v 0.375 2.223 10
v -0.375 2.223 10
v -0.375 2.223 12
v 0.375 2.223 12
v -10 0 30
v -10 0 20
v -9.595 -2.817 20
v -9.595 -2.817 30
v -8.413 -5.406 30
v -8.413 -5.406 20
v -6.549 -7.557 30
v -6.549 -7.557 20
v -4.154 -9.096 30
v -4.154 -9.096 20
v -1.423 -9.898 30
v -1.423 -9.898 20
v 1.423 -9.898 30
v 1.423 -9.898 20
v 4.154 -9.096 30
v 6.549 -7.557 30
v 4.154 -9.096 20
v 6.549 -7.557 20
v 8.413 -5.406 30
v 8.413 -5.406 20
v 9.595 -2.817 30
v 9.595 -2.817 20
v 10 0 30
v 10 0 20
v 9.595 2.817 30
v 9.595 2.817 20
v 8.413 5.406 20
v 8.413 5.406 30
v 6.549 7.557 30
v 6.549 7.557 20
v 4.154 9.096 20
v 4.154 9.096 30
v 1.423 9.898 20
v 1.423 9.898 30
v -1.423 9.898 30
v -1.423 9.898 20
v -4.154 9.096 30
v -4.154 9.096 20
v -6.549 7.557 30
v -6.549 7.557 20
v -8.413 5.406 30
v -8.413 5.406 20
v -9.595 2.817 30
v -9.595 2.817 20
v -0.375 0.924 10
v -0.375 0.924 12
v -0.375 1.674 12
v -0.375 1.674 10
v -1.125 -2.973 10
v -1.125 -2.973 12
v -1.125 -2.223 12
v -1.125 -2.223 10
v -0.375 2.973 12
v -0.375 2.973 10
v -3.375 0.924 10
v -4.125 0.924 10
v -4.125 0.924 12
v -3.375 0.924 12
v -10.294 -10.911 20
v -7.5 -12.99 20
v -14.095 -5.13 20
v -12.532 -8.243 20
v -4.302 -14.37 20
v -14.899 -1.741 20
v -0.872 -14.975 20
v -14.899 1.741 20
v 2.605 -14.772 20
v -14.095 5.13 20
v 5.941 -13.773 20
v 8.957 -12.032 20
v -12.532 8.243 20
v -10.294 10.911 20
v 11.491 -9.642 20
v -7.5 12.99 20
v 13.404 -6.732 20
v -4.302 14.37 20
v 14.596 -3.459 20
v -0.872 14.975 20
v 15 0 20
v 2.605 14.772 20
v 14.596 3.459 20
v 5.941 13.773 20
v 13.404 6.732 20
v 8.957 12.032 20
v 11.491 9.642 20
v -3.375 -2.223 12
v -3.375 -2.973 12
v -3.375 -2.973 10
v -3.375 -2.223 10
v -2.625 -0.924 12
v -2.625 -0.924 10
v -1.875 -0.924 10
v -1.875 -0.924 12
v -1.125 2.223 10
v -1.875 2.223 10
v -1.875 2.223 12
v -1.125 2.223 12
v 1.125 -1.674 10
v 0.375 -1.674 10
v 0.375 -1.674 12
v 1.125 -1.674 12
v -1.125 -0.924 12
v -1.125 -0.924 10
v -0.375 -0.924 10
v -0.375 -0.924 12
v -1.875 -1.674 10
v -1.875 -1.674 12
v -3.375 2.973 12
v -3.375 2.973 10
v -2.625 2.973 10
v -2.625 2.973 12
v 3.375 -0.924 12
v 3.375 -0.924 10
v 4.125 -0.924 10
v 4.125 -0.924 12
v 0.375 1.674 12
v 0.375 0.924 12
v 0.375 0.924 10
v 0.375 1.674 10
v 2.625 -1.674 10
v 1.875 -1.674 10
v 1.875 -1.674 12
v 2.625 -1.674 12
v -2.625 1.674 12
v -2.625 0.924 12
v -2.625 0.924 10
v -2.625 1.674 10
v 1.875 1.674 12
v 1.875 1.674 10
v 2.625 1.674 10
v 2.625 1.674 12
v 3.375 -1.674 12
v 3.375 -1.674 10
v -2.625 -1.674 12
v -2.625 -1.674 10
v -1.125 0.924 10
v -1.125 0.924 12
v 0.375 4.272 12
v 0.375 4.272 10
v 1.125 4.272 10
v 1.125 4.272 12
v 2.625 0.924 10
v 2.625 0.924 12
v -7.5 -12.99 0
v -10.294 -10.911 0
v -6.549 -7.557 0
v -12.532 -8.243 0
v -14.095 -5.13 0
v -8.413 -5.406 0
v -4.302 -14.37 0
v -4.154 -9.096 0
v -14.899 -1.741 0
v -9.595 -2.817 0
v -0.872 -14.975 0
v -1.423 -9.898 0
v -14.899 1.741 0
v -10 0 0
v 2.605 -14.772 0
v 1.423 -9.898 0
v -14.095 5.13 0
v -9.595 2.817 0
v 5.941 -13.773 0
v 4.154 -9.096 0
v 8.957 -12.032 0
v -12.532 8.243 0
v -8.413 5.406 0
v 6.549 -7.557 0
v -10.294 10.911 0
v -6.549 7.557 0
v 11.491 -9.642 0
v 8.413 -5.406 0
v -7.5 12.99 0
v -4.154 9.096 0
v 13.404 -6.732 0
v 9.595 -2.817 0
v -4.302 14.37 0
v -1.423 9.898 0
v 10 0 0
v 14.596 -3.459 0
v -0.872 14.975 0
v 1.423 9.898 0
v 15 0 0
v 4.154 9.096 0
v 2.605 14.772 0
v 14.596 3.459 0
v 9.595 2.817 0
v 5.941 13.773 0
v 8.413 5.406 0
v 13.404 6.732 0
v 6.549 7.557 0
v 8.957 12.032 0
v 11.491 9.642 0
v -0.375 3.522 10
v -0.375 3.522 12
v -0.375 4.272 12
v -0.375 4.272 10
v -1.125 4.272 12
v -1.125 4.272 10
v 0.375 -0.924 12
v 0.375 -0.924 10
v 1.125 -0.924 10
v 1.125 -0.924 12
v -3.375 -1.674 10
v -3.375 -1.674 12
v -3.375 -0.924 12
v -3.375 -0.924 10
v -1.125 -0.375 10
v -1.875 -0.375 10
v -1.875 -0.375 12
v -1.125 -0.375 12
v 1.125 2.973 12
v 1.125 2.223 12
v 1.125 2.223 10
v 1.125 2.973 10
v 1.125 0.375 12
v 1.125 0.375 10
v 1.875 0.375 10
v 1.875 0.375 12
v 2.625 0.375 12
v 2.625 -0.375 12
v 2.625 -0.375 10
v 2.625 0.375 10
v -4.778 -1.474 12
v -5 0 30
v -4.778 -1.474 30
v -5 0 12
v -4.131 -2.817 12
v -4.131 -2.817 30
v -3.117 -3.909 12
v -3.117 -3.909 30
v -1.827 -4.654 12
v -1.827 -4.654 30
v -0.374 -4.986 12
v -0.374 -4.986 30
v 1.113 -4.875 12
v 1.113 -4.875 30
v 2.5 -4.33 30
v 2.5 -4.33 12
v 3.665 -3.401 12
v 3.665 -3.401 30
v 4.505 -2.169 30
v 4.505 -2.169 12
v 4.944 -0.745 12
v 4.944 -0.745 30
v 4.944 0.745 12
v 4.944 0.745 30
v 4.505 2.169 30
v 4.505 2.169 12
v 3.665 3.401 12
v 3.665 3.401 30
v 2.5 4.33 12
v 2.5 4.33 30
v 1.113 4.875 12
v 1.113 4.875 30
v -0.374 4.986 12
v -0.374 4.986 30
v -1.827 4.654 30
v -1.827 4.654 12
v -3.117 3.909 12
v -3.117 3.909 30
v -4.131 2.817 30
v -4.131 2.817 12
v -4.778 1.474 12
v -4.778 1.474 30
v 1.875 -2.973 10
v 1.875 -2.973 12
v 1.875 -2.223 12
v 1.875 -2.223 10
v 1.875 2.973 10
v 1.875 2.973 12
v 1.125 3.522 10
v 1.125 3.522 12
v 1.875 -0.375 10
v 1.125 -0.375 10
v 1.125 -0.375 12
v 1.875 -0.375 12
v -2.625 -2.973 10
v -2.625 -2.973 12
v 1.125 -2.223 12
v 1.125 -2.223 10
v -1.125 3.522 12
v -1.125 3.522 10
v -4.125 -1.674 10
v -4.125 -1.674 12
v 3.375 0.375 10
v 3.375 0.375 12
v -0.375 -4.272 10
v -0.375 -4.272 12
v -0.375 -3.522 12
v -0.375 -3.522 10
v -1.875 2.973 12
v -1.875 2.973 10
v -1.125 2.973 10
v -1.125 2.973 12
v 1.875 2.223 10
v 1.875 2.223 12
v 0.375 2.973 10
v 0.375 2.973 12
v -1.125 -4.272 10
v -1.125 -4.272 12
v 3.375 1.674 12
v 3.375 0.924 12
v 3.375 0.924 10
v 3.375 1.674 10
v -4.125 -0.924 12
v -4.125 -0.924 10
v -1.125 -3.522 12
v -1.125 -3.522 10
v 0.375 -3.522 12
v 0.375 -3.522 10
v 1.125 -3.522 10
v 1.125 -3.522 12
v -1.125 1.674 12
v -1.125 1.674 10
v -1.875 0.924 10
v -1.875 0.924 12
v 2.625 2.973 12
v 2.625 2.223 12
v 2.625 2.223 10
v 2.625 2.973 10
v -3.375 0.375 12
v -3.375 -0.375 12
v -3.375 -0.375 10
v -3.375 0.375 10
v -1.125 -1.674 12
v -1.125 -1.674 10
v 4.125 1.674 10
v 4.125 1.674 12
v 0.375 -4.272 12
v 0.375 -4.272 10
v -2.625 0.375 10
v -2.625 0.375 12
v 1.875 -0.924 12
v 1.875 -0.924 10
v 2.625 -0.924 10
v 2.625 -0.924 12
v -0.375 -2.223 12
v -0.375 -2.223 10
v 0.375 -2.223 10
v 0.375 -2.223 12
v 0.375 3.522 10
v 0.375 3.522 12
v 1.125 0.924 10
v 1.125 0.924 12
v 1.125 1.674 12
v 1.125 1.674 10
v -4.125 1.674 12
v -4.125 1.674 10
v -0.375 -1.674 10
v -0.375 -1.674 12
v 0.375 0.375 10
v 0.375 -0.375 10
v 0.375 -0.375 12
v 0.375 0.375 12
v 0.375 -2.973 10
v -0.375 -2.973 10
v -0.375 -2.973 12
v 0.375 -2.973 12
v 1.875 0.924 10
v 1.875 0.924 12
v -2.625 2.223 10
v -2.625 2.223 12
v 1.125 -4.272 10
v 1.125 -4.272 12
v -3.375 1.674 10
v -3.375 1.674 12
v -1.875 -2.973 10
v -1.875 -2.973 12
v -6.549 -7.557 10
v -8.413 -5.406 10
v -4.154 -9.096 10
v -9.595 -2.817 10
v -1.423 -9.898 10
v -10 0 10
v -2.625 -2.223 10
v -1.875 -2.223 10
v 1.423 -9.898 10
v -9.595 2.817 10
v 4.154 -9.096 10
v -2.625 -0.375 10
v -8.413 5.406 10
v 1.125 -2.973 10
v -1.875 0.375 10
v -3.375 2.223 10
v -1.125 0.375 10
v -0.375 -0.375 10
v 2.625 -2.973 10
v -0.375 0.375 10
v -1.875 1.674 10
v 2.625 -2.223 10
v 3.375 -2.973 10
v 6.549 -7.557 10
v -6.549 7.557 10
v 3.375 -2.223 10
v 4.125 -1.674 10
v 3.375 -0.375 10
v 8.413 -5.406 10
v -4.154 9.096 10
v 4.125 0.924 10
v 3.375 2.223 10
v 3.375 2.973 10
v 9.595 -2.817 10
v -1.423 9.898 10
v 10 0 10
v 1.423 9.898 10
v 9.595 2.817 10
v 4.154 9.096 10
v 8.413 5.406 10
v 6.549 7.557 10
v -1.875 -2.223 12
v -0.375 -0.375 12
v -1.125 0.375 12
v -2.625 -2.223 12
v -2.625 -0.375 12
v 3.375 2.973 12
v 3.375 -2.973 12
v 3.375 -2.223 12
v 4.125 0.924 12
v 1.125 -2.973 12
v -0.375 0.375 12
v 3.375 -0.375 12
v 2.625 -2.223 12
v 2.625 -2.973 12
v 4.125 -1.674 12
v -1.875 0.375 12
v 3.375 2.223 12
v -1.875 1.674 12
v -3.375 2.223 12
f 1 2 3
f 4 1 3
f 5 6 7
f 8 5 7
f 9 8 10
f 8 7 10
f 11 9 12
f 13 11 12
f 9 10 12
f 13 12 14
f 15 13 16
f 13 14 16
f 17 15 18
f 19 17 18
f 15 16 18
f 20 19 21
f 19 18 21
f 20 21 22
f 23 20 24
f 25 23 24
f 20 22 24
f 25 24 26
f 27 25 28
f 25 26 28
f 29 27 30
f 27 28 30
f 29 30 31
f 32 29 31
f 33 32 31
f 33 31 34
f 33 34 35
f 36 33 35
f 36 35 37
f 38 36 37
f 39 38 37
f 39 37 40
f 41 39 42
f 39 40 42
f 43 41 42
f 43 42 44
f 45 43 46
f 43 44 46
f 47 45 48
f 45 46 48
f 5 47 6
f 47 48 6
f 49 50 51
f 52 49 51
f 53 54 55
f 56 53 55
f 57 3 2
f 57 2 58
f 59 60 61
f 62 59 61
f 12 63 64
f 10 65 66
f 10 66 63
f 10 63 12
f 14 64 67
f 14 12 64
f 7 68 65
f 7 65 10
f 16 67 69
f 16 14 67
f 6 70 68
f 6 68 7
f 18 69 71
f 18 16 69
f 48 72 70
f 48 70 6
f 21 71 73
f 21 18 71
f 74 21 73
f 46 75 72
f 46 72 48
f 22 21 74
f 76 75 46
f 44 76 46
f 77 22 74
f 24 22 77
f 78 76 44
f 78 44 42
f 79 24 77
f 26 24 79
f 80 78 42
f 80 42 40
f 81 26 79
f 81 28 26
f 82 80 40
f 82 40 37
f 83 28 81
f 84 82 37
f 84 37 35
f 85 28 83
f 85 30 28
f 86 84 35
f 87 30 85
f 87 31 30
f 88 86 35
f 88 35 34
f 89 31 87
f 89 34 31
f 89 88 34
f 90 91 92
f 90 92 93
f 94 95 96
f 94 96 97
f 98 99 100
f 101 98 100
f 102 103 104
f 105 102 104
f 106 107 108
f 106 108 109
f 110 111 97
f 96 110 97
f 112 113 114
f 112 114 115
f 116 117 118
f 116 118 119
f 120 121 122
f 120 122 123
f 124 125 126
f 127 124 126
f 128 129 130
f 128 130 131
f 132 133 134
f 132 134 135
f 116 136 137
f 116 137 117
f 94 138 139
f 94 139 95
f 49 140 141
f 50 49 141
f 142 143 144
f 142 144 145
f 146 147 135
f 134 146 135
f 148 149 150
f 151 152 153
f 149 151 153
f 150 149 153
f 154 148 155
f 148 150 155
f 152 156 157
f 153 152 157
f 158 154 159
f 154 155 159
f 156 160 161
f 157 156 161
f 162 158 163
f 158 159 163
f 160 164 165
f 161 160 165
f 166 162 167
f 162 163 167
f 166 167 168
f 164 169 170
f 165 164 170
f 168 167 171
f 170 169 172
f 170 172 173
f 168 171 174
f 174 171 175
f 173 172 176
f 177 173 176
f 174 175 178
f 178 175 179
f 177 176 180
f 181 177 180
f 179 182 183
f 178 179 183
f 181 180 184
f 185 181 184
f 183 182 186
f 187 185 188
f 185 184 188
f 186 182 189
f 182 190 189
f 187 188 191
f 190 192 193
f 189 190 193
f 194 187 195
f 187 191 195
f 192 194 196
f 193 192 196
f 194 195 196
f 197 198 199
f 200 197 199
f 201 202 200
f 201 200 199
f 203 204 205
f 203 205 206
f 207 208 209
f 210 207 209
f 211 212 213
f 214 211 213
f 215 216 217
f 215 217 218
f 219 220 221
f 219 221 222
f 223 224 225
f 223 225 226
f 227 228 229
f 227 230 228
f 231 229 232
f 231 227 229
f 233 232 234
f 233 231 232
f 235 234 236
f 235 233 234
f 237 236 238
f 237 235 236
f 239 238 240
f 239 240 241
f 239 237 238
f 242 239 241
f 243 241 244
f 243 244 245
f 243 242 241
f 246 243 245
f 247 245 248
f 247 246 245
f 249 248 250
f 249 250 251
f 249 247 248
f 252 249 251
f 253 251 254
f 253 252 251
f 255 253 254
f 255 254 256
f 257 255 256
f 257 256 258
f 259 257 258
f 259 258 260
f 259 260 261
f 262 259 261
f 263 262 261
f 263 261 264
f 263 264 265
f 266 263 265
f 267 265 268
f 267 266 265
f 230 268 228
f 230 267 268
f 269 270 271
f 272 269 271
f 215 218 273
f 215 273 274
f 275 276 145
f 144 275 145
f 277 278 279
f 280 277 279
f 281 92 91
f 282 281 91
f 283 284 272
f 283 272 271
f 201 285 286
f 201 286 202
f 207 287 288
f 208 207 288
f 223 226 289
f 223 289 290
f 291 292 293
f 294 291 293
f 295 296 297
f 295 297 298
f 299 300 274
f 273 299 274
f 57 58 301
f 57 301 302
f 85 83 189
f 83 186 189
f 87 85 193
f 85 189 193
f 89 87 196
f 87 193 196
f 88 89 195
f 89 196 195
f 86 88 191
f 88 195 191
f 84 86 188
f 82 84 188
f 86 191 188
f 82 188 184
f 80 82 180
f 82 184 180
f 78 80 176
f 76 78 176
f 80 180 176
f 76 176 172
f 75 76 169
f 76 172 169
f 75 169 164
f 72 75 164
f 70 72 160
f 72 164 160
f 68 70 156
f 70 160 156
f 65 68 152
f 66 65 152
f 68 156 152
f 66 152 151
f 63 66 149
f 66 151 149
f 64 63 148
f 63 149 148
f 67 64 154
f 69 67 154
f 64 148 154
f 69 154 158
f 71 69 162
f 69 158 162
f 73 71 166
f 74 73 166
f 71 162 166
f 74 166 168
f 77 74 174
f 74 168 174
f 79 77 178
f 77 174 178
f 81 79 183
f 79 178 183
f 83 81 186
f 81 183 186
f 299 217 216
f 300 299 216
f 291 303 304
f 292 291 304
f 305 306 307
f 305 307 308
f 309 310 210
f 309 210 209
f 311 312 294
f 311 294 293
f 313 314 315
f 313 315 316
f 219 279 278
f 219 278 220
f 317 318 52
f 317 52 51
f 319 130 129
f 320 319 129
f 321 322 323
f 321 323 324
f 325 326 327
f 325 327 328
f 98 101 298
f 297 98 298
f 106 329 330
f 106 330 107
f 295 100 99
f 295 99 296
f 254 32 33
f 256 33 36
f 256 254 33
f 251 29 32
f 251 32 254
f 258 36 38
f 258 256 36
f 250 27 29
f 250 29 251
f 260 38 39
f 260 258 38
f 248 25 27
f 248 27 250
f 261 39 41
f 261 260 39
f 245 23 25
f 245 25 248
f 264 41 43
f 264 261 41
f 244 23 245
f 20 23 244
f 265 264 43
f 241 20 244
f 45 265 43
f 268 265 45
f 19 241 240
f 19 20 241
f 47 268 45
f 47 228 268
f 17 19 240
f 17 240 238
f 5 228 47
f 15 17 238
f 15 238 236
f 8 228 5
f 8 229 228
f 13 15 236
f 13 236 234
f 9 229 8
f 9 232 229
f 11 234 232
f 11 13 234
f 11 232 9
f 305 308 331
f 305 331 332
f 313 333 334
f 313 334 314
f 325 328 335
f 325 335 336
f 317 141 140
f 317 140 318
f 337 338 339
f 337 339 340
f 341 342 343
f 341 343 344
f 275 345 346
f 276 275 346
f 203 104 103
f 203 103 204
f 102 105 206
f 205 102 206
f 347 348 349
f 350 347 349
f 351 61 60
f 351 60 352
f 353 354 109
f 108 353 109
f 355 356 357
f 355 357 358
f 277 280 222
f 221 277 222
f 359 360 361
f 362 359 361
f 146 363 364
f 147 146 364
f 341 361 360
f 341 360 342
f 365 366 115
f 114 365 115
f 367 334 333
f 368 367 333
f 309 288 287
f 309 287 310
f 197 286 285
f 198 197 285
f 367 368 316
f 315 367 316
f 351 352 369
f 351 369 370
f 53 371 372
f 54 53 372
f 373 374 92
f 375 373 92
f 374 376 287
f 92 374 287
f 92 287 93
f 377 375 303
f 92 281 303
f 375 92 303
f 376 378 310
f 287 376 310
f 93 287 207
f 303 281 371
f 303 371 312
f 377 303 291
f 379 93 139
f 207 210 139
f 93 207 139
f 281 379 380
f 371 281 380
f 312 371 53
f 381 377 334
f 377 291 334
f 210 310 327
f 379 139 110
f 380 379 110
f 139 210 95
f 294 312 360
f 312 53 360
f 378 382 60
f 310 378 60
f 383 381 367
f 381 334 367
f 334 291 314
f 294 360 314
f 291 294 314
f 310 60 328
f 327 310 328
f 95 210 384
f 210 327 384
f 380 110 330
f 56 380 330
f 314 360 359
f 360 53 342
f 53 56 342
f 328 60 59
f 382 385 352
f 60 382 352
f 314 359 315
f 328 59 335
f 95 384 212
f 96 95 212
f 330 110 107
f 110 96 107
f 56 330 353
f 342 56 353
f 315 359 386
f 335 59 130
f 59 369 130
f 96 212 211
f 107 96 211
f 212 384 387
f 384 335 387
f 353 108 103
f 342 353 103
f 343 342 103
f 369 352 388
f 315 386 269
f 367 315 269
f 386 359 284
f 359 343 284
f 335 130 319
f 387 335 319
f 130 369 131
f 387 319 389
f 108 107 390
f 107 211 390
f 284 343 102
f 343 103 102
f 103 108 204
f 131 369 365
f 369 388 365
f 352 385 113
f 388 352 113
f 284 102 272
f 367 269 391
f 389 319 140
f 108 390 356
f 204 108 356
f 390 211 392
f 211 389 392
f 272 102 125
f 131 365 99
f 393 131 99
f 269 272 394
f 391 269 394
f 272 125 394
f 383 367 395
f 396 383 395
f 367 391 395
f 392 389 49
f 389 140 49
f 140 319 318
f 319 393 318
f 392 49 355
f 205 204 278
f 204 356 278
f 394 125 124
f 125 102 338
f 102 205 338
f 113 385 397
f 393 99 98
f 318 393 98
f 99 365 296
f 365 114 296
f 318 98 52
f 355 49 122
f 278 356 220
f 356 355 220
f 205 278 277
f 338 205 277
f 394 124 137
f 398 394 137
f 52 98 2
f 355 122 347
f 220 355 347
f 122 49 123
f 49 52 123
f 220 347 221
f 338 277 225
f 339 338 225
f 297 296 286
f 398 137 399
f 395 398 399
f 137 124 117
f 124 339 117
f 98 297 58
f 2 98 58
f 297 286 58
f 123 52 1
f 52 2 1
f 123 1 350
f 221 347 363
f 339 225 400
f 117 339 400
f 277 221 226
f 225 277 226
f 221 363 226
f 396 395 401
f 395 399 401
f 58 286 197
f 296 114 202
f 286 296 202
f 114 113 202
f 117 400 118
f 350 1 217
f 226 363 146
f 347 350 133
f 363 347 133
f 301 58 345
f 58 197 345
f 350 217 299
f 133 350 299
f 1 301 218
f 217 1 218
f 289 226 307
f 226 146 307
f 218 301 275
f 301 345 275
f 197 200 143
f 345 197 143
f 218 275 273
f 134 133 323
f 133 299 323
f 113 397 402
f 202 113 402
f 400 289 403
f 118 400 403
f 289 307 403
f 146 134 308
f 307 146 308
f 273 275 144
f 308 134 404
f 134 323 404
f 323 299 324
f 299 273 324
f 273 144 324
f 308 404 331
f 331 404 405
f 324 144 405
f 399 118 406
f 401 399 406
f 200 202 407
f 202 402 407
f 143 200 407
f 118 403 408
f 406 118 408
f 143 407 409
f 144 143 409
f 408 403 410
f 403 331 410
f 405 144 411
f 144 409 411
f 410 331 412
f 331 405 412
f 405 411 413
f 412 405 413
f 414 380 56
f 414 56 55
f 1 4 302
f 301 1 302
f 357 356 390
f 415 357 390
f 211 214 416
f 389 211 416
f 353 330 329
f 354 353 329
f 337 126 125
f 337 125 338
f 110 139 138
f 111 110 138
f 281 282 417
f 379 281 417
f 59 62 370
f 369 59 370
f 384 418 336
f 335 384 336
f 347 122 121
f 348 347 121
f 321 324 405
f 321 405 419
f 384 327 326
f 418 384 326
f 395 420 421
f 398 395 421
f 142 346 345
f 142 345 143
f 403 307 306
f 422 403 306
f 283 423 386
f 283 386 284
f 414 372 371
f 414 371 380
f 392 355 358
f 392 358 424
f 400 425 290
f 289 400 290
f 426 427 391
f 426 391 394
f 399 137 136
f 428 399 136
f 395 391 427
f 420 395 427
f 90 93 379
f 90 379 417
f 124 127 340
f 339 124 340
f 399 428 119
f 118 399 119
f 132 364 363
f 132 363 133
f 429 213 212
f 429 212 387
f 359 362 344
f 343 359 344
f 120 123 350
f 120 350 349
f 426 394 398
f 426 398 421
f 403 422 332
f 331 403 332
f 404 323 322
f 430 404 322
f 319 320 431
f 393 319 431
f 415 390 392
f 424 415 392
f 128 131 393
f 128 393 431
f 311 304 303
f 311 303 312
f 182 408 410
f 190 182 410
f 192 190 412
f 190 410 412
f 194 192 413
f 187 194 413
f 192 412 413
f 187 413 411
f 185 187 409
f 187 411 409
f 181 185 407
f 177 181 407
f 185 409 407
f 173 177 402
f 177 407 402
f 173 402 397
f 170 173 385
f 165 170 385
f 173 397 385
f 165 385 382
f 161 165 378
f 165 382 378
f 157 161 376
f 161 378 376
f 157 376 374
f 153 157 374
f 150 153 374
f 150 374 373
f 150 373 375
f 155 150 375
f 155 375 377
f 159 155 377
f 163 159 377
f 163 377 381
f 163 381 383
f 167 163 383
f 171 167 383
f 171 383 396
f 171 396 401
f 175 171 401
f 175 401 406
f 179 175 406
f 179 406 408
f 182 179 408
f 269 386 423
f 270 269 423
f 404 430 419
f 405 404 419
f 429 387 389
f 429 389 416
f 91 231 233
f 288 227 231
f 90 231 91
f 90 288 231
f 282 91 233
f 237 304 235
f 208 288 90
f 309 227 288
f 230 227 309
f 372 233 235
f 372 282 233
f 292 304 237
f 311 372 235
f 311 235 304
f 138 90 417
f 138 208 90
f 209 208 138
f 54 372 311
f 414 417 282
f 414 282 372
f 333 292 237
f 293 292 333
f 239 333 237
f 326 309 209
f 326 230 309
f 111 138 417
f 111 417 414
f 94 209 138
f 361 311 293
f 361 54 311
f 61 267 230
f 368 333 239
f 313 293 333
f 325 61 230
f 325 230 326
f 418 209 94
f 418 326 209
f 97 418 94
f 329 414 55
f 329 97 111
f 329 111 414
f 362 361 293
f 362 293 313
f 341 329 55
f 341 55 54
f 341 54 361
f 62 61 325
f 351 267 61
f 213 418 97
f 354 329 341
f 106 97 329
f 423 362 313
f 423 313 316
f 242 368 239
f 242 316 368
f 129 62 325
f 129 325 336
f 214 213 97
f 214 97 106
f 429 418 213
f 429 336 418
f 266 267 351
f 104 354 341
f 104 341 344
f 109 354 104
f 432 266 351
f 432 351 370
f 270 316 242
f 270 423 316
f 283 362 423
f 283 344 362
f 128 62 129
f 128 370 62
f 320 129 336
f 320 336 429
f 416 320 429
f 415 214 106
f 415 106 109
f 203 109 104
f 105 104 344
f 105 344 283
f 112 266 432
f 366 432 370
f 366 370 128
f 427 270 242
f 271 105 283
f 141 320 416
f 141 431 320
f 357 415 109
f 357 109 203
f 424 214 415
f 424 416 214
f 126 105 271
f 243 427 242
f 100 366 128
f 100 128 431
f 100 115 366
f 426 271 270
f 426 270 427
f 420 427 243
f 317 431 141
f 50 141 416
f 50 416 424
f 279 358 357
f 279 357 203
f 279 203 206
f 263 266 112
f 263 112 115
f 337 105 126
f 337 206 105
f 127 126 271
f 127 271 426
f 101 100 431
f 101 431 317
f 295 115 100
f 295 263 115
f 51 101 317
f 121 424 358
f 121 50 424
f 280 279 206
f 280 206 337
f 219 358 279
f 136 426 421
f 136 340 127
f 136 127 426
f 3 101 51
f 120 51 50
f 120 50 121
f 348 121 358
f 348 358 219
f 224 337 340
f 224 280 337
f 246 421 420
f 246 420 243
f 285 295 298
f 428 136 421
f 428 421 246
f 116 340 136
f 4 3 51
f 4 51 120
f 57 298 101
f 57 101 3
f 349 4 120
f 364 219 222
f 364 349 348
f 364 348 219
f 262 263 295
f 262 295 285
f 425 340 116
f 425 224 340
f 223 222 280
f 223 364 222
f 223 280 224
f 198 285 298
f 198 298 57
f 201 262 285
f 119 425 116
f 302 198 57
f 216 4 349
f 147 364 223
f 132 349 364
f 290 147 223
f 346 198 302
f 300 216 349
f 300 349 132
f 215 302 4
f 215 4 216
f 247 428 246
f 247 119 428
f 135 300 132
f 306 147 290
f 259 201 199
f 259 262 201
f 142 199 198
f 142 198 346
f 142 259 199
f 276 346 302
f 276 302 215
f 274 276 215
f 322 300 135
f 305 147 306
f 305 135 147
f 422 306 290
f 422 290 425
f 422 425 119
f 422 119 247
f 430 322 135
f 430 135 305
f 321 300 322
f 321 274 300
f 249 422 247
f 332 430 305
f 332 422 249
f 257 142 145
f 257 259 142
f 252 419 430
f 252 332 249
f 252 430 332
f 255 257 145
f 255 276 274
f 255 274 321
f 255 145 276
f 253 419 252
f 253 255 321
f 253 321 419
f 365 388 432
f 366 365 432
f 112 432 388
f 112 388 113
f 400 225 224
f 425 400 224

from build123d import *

# Parameters (mm, degrees)
SKETCH1_R                  = 15
BOSS_EXTRUDE1_DEPTH        = 10
SKETCH2_R                  = 10
CUT_EXTRUDE1_DEPTH         = 20
SKETCH3_R                  = 15
BOSS_EXTRUDE2_DEPTH        = 10
SKETCH5_R                  = 10
CUT_EXTRUDE3_DEPTH         = 8
SKETCH8_W                  = 0.75
SKETCH8_H                  = 0.75
CUT_EXTRUDE5_DEPTH         = 2
FILL_START                 = -1.125
FILL_PATTERN2_OUTLINE_W    = 0.75
FILL_PATTERN2_OUTLINE_H    = 2
FILL_PATTERN2_DEPTH        = 0.75
FILL_START_2               = 0.375
FILL_PATTERN2_2_OUTLINE_W  = 0.75
FILL_PATTERN2_2_OUTLINE_H  = 2
FILL_PATTERN2_2_DEPTH      = 0.75
FILL_START_3               = -3.375
FILL_PATTERN2_3_OUTLINE_W  = 0.75
FILL_PATTERN2_3_OUTLINE_H  = 2
FILL_PATTERN2_3_DEPTH      = 0.75
FILL_START_4               = -1.875
FILL_PATTERN2_4_OUTLINE_W  = 0.75
FILL_PATTERN2_4_OUTLINE_H  = 2
FILL_PATTERN2_4_DEPTH      = 0.75
FILL_START_5               = 1.125
FILL_PATTERN2_5_OUTLINE_W  = 0.75
FILL_PATTERN2_5_OUTLINE_H  = 2
FILL_PATTERN2_5_DEPTH      = 0.75
FILL_START_6               = 2.625
FILL_PATTERN2_6_OUTLINE_W  = 0.75
FILL_PATTERN2_6_OUTLINE_H  = 2
FILL_PATTERN2_6_DEPTH      = 0.75
FILL_START_7               = -4.125
FILL_PATTERN2_7_OUTLINE_W  = 0.75
FILL_PATTERN2_7_OUTLINE_H  = 2
FILL_PATTERN2_7_DEPTH      = 0.75
FILL_START_8               = -2.625
FILL_PATTERN2_8_OUTLINE_W  = 0.75
FILL_PATTERN2_8_OUTLINE_H  = 2
FILL_PATTERN2_8_DEPTH      = 0.75
FILL_START_9               = -0.375
FILL_PATTERN2_9_OUTLINE_W  = 0.75
FILL_PATTERN2_9_OUTLINE_H  = 2
FILL_PATTERN2_9_DEPTH      = 0.75
FILL_START_10              = 1.875
FILL_PATTERN2_10_OUTLINE_W = 0.75
FILL_PATTERN2_10_OUTLINE_H = 2
FILL_PATTERN2_10_DEPTH     = 0.75
FILL_START_11              = 3.375
FILL_PATTERN2_11_OUTLINE_W = 0.75
FILL_PATTERN2_11_OUTLINE_H = 2
FILL_PATTERN2_11_DEPTH     = 0.75
SKETCH12_W                 = 18
SKETCH12_H                 = 5


# Read off the part's stored shape, not the designer's step: Fill Pattern2
with BuildPart() as part:
    # Sketch1 → Boss-Extrude1 (new body)
    with BuildSketch(Plane.XY):
        Circle(SKETCH1_R)
    extrude(amount=BOSS_EXTRUDE1_DEPTH)

    # Sketch2 → Cut-Extrude1 (cut)
    with BuildSketch(Plane.XY.offset(10)):
        Circle(SKETCH2_R)
    extrude(amount=-CUT_EXTRUDE1_DEPTH, mode=Mode.SUBTRACT)

    # Sketch3 → Boss-Extrude2 (add)
    with BuildSketch(Plane.XY.offset(10)):
        Circle(SKETCH3_R)
    extrude(amount=BOSS_EXTRUDE2_DEPTH)

    # Sketch5 → Cut-Extrude3 (cut)
    with BuildSketch(Plane.XY.offset(20)):
        Circle(SKETCH5_R)
    extrude(amount=-CUT_EXTRUDE3_DEPTH, mode=Mode.SUBTRACT)

    # Sketch8 → Cut-Extrude5 (cut)
    with BuildSketch(Plane(origin=(0, 0, 10), x_dir=(-1, 0, 0), z_dir=(0, 0, -1))):
        Rectangle(SKETCH8_W, SKETCH8_H)
    extrude(amount=-CUT_EXTRUDE5_DEPTH, mode=Mode.SUBTRACT)

    # Fill Pattern2 outline → Fill Pattern2 (cut)
    with BuildSketch(Plane.YZ.offset(FILL_START)):
        with Locations((-1.299038106, 11)):
            Rectangle(FILL_PATTERN2_OUTLINE_W, FILL_PATTERN2_OUTLINE_H)
        with Locations((1.299038106, 11)):
            Rectangle(FILL_PATTERN2_OUTLINE_W, FILL_PATTERN2_OUTLINE_H)
        with Locations((-3.897114317, 11)):
            Rectangle(FILL_PATTERN2_OUTLINE_W, FILL_PATTERN2_OUTLINE_H)
        with Locations((3.897114317, 11)):
            Rectangle(FILL_PATTERN2_OUTLINE_W, FILL_PATTERN2_OUTLINE_H)
    extrude(amount=FILL_PATTERN2_DEPTH, mode=Mode.SUBTRACT)

    # Fill Pattern2 2 outline → Fill Pattern2 2 (cut)
    with BuildSketch(Plane.YZ.offset(FILL_START_2)):
        with Locations((-1.299038106, 11)):
            Rectangle(FILL_PATTERN2_2_OUTLINE_W, FILL_PATTERN2_2_OUTLINE_H)
        with Locations((1.299038106, 11)):
            Rectangle(FILL_PATTERN2_2_OUTLINE_W, FILL_PATTERN2_2_OUTLINE_H)
        with Locations((-3.897114317, 11)):
            Rectangle(FILL_PATTERN2_2_OUTLINE_W, FILL_PATTERN2_2_OUTLINE_H)
        with Locations((3.897114317, 11)):
            Rectangle(FILL_PATTERN2_2_OUTLINE_W, FILL_PATTERN2_2_OUTLINE_H)
    extrude(amount=FILL_PATTERN2_2_DEPTH, mode=Mode.SUBTRACT)

    # Fill Pattern2 3 outline → Fill Pattern2 3 (cut)
    with BuildSketch(Plane.YZ.offset(FILL_START_3)):
        with Locations((0, 11)):
            Rectangle(FILL_PATTERN2_3_OUTLINE_W, FILL_PATTERN2_3_OUTLINE_H)
        with Locations((-2.598076211, 11)):
            Rectangle(FILL_PATTERN2_3_OUTLINE_W, FILL_PATTERN2_3_OUTLINE_H)
        with Locations((2.598076211, 11)):
            Rectangle(FILL_PATTERN2_3_OUTLINE_W, FILL_PATTERN2_3_OUTLINE_H)
    extrude(amount=FILL_PATTERN2_3_DEPTH, mode=Mode.SUBTRACT)

    # Fill Pattern2 4 outline → Fill Pattern2 4 (cut)
    with BuildSketch(Plane.YZ.offset(FILL_START_4)):
        with Locations((0, 11)):
            Rectangle(FILL_PATTERN2_4_OUTLINE_W, FILL_PATTERN2_4_OUTLINE_H)
        with Locations((-2.598076211, 11)):
            Rectangle(FILL_PATTERN2_4_OUTLINE_W, FILL_PATTERN2_4_OUTLINE_H)
        with Locations((2.598076211, 11)):
            Rectangle(FILL_PATTERN2_4_OUTLINE_W, FILL_PATTERN2_4_OUTLINE_H)
    extrude(amount=FILL_PATTERN2_4_DEPTH, mode=Mode.SUBTRACT)

    # Fill Pattern2 5 outline → Fill Pattern2 5 (cut)
    with BuildSketch(Plane.YZ.offset(FILL_START_5)):
        with Locations((0, 11)):
            Rectangle(FILL_PATTERN2_5_OUTLINE_W, FILL_PATTERN2_5_OUTLINE_H)
        with Locations((-2.598076211, 11)):
            Rectangle(FILL_PATTERN2_5_OUTLINE_W, FILL_PATTERN2_5_OUTLINE_H)
        with Locations((2.598076211, 11)):
            Rectangle(FILL_PATTERN2_5_OUTLINE_W, FILL_PATTERN2_5_OUTLINE_H)
    extrude(amount=FILL_PATTERN2_5_DEPTH, mode=Mode.SUBTRACT)

    # Fill Pattern2 6 outline → Fill Pattern2 6 (cut)
    with BuildSketch(Plane.YZ.offset(FILL_START_6)):
        with Locations((0, 11)):
            Rectangle(FILL_PATTERN2_6_OUTLINE_W, FILL_PATTERN2_6_OUTLINE_H)
        with Locations((-2.598076211, 11)):
            Rectangle(FILL_PATTERN2_6_OUTLINE_W, FILL_PATTERN2_6_OUTLINE_H)
        with Locations((2.598076211, 11)):
            Rectangle(FILL_PATTERN2_6_OUTLINE_W, FILL_PATTERN2_6_OUTLINE_H)
    extrude(amount=FILL_PATTERN2_6_DEPTH, mode=Mode.SUBTRACT)

    # Fill Pattern2 7 outline → Fill Pattern2 7 (cut)
    with BuildSketch(Plane.YZ.offset(FILL_START_7)):
        with Locations((-1.299038106, 11)):
            Rectangle(FILL_PATTERN2_7_OUTLINE_W, FILL_PATTERN2_7_OUTLINE_H)
        with Locations((1.299038106, 11)):
            Rectangle(FILL_PATTERN2_7_OUTLINE_W, FILL_PATTERN2_7_OUTLINE_H)
    extrude(amount=FILL_PATTERN2_7_DEPTH, mode=Mode.SUBTRACT)

    # Fill Pattern2 8 outline → Fill Pattern2 8 (cut)
    with BuildSketch(Plane.YZ.offset(FILL_START_8)):
        with Locations((-1.299038106, 11)):
            Rectangle(FILL_PATTERN2_8_OUTLINE_W, FILL_PATTERN2_8_OUTLINE_H)
        with Locations((1.299038106, 11)):
            Rectangle(FILL_PATTERN2_8_OUTLINE_W, FILL_PATTERN2_8_OUTLINE_H)
    extrude(amount=FILL_PATTERN2_8_DEPTH, mode=Mode.SUBTRACT)

    # Fill Pattern2 9 outline → Fill Pattern2 9 (cut)
    with BuildSketch(Plane.YZ.offset(FILL_START_9)):
        with Locations((-2.598076211, 11)):
            Rectangle(FILL_PATTERN2_9_OUTLINE_W, FILL_PATTERN2_9_OUTLINE_H)
        with Locations((2.598076211, 11)):
            Rectangle(FILL_PATTERN2_9_OUTLINE_W, FILL_PATTERN2_9_OUTLINE_H)
    extrude(amount=FILL_PATTERN2_9_DEPTH, mode=Mode.SUBTRACT)

    # Fill Pattern2 10 outline → Fill Pattern2 10 (cut)
    with BuildSketch(Plane.YZ.offset(FILL_START_10)):
        with Locations((-1.299038106, 11)):
            Rectangle(FILL_PATTERN2_10_OUTLINE_W, FILL_PATTERN2_10_OUTLINE_H)
        with Locations((1.299038106, 11)):
            Rectangle(FILL_PATTERN2_10_OUTLINE_W, FILL_PATTERN2_10_OUTLINE_H)
    extrude(amount=FILL_PATTERN2_10_DEPTH, mode=Mode.SUBTRACT)

    # Fill Pattern2 11 outline → Fill Pattern2 11 (cut)
    with BuildSketch(Plane.YZ.offset(FILL_START_11)):
        with Locations((-1.299038106, 11)):
            Rectangle(FILL_PATTERN2_11_OUTLINE_W, FILL_PATTERN2_11_OUTLINE_H)
        with Locations((1.299038106, 11)):
            Rectangle(FILL_PATTERN2_11_OUTLINE_W, FILL_PATTERN2_11_OUTLINE_H)
    extrude(amount=FILL_PATTERN2_11_DEPTH, mode=Mode.SUBTRACT)

    # Sketch12 → Revolve2 (revolve)
    with BuildSketch(Plane(origin=(0, 0, 0), x_dir=(0, 0, -1), z_dir=(1, 0, 0)), mode=Mode.PRIVATE) as revolve2_sk:
        with Locations((-21, -7.5)):
            Rectangle(SKETCH12_W, SKETCH12_H)
    revolve(revolve2_sk.sketch.rotate(Axis((0, 0, 0), (0, 0, 1)), 270), axis=Axis((0, 0, 0), (0, 0, 1)))


solid = part.part
